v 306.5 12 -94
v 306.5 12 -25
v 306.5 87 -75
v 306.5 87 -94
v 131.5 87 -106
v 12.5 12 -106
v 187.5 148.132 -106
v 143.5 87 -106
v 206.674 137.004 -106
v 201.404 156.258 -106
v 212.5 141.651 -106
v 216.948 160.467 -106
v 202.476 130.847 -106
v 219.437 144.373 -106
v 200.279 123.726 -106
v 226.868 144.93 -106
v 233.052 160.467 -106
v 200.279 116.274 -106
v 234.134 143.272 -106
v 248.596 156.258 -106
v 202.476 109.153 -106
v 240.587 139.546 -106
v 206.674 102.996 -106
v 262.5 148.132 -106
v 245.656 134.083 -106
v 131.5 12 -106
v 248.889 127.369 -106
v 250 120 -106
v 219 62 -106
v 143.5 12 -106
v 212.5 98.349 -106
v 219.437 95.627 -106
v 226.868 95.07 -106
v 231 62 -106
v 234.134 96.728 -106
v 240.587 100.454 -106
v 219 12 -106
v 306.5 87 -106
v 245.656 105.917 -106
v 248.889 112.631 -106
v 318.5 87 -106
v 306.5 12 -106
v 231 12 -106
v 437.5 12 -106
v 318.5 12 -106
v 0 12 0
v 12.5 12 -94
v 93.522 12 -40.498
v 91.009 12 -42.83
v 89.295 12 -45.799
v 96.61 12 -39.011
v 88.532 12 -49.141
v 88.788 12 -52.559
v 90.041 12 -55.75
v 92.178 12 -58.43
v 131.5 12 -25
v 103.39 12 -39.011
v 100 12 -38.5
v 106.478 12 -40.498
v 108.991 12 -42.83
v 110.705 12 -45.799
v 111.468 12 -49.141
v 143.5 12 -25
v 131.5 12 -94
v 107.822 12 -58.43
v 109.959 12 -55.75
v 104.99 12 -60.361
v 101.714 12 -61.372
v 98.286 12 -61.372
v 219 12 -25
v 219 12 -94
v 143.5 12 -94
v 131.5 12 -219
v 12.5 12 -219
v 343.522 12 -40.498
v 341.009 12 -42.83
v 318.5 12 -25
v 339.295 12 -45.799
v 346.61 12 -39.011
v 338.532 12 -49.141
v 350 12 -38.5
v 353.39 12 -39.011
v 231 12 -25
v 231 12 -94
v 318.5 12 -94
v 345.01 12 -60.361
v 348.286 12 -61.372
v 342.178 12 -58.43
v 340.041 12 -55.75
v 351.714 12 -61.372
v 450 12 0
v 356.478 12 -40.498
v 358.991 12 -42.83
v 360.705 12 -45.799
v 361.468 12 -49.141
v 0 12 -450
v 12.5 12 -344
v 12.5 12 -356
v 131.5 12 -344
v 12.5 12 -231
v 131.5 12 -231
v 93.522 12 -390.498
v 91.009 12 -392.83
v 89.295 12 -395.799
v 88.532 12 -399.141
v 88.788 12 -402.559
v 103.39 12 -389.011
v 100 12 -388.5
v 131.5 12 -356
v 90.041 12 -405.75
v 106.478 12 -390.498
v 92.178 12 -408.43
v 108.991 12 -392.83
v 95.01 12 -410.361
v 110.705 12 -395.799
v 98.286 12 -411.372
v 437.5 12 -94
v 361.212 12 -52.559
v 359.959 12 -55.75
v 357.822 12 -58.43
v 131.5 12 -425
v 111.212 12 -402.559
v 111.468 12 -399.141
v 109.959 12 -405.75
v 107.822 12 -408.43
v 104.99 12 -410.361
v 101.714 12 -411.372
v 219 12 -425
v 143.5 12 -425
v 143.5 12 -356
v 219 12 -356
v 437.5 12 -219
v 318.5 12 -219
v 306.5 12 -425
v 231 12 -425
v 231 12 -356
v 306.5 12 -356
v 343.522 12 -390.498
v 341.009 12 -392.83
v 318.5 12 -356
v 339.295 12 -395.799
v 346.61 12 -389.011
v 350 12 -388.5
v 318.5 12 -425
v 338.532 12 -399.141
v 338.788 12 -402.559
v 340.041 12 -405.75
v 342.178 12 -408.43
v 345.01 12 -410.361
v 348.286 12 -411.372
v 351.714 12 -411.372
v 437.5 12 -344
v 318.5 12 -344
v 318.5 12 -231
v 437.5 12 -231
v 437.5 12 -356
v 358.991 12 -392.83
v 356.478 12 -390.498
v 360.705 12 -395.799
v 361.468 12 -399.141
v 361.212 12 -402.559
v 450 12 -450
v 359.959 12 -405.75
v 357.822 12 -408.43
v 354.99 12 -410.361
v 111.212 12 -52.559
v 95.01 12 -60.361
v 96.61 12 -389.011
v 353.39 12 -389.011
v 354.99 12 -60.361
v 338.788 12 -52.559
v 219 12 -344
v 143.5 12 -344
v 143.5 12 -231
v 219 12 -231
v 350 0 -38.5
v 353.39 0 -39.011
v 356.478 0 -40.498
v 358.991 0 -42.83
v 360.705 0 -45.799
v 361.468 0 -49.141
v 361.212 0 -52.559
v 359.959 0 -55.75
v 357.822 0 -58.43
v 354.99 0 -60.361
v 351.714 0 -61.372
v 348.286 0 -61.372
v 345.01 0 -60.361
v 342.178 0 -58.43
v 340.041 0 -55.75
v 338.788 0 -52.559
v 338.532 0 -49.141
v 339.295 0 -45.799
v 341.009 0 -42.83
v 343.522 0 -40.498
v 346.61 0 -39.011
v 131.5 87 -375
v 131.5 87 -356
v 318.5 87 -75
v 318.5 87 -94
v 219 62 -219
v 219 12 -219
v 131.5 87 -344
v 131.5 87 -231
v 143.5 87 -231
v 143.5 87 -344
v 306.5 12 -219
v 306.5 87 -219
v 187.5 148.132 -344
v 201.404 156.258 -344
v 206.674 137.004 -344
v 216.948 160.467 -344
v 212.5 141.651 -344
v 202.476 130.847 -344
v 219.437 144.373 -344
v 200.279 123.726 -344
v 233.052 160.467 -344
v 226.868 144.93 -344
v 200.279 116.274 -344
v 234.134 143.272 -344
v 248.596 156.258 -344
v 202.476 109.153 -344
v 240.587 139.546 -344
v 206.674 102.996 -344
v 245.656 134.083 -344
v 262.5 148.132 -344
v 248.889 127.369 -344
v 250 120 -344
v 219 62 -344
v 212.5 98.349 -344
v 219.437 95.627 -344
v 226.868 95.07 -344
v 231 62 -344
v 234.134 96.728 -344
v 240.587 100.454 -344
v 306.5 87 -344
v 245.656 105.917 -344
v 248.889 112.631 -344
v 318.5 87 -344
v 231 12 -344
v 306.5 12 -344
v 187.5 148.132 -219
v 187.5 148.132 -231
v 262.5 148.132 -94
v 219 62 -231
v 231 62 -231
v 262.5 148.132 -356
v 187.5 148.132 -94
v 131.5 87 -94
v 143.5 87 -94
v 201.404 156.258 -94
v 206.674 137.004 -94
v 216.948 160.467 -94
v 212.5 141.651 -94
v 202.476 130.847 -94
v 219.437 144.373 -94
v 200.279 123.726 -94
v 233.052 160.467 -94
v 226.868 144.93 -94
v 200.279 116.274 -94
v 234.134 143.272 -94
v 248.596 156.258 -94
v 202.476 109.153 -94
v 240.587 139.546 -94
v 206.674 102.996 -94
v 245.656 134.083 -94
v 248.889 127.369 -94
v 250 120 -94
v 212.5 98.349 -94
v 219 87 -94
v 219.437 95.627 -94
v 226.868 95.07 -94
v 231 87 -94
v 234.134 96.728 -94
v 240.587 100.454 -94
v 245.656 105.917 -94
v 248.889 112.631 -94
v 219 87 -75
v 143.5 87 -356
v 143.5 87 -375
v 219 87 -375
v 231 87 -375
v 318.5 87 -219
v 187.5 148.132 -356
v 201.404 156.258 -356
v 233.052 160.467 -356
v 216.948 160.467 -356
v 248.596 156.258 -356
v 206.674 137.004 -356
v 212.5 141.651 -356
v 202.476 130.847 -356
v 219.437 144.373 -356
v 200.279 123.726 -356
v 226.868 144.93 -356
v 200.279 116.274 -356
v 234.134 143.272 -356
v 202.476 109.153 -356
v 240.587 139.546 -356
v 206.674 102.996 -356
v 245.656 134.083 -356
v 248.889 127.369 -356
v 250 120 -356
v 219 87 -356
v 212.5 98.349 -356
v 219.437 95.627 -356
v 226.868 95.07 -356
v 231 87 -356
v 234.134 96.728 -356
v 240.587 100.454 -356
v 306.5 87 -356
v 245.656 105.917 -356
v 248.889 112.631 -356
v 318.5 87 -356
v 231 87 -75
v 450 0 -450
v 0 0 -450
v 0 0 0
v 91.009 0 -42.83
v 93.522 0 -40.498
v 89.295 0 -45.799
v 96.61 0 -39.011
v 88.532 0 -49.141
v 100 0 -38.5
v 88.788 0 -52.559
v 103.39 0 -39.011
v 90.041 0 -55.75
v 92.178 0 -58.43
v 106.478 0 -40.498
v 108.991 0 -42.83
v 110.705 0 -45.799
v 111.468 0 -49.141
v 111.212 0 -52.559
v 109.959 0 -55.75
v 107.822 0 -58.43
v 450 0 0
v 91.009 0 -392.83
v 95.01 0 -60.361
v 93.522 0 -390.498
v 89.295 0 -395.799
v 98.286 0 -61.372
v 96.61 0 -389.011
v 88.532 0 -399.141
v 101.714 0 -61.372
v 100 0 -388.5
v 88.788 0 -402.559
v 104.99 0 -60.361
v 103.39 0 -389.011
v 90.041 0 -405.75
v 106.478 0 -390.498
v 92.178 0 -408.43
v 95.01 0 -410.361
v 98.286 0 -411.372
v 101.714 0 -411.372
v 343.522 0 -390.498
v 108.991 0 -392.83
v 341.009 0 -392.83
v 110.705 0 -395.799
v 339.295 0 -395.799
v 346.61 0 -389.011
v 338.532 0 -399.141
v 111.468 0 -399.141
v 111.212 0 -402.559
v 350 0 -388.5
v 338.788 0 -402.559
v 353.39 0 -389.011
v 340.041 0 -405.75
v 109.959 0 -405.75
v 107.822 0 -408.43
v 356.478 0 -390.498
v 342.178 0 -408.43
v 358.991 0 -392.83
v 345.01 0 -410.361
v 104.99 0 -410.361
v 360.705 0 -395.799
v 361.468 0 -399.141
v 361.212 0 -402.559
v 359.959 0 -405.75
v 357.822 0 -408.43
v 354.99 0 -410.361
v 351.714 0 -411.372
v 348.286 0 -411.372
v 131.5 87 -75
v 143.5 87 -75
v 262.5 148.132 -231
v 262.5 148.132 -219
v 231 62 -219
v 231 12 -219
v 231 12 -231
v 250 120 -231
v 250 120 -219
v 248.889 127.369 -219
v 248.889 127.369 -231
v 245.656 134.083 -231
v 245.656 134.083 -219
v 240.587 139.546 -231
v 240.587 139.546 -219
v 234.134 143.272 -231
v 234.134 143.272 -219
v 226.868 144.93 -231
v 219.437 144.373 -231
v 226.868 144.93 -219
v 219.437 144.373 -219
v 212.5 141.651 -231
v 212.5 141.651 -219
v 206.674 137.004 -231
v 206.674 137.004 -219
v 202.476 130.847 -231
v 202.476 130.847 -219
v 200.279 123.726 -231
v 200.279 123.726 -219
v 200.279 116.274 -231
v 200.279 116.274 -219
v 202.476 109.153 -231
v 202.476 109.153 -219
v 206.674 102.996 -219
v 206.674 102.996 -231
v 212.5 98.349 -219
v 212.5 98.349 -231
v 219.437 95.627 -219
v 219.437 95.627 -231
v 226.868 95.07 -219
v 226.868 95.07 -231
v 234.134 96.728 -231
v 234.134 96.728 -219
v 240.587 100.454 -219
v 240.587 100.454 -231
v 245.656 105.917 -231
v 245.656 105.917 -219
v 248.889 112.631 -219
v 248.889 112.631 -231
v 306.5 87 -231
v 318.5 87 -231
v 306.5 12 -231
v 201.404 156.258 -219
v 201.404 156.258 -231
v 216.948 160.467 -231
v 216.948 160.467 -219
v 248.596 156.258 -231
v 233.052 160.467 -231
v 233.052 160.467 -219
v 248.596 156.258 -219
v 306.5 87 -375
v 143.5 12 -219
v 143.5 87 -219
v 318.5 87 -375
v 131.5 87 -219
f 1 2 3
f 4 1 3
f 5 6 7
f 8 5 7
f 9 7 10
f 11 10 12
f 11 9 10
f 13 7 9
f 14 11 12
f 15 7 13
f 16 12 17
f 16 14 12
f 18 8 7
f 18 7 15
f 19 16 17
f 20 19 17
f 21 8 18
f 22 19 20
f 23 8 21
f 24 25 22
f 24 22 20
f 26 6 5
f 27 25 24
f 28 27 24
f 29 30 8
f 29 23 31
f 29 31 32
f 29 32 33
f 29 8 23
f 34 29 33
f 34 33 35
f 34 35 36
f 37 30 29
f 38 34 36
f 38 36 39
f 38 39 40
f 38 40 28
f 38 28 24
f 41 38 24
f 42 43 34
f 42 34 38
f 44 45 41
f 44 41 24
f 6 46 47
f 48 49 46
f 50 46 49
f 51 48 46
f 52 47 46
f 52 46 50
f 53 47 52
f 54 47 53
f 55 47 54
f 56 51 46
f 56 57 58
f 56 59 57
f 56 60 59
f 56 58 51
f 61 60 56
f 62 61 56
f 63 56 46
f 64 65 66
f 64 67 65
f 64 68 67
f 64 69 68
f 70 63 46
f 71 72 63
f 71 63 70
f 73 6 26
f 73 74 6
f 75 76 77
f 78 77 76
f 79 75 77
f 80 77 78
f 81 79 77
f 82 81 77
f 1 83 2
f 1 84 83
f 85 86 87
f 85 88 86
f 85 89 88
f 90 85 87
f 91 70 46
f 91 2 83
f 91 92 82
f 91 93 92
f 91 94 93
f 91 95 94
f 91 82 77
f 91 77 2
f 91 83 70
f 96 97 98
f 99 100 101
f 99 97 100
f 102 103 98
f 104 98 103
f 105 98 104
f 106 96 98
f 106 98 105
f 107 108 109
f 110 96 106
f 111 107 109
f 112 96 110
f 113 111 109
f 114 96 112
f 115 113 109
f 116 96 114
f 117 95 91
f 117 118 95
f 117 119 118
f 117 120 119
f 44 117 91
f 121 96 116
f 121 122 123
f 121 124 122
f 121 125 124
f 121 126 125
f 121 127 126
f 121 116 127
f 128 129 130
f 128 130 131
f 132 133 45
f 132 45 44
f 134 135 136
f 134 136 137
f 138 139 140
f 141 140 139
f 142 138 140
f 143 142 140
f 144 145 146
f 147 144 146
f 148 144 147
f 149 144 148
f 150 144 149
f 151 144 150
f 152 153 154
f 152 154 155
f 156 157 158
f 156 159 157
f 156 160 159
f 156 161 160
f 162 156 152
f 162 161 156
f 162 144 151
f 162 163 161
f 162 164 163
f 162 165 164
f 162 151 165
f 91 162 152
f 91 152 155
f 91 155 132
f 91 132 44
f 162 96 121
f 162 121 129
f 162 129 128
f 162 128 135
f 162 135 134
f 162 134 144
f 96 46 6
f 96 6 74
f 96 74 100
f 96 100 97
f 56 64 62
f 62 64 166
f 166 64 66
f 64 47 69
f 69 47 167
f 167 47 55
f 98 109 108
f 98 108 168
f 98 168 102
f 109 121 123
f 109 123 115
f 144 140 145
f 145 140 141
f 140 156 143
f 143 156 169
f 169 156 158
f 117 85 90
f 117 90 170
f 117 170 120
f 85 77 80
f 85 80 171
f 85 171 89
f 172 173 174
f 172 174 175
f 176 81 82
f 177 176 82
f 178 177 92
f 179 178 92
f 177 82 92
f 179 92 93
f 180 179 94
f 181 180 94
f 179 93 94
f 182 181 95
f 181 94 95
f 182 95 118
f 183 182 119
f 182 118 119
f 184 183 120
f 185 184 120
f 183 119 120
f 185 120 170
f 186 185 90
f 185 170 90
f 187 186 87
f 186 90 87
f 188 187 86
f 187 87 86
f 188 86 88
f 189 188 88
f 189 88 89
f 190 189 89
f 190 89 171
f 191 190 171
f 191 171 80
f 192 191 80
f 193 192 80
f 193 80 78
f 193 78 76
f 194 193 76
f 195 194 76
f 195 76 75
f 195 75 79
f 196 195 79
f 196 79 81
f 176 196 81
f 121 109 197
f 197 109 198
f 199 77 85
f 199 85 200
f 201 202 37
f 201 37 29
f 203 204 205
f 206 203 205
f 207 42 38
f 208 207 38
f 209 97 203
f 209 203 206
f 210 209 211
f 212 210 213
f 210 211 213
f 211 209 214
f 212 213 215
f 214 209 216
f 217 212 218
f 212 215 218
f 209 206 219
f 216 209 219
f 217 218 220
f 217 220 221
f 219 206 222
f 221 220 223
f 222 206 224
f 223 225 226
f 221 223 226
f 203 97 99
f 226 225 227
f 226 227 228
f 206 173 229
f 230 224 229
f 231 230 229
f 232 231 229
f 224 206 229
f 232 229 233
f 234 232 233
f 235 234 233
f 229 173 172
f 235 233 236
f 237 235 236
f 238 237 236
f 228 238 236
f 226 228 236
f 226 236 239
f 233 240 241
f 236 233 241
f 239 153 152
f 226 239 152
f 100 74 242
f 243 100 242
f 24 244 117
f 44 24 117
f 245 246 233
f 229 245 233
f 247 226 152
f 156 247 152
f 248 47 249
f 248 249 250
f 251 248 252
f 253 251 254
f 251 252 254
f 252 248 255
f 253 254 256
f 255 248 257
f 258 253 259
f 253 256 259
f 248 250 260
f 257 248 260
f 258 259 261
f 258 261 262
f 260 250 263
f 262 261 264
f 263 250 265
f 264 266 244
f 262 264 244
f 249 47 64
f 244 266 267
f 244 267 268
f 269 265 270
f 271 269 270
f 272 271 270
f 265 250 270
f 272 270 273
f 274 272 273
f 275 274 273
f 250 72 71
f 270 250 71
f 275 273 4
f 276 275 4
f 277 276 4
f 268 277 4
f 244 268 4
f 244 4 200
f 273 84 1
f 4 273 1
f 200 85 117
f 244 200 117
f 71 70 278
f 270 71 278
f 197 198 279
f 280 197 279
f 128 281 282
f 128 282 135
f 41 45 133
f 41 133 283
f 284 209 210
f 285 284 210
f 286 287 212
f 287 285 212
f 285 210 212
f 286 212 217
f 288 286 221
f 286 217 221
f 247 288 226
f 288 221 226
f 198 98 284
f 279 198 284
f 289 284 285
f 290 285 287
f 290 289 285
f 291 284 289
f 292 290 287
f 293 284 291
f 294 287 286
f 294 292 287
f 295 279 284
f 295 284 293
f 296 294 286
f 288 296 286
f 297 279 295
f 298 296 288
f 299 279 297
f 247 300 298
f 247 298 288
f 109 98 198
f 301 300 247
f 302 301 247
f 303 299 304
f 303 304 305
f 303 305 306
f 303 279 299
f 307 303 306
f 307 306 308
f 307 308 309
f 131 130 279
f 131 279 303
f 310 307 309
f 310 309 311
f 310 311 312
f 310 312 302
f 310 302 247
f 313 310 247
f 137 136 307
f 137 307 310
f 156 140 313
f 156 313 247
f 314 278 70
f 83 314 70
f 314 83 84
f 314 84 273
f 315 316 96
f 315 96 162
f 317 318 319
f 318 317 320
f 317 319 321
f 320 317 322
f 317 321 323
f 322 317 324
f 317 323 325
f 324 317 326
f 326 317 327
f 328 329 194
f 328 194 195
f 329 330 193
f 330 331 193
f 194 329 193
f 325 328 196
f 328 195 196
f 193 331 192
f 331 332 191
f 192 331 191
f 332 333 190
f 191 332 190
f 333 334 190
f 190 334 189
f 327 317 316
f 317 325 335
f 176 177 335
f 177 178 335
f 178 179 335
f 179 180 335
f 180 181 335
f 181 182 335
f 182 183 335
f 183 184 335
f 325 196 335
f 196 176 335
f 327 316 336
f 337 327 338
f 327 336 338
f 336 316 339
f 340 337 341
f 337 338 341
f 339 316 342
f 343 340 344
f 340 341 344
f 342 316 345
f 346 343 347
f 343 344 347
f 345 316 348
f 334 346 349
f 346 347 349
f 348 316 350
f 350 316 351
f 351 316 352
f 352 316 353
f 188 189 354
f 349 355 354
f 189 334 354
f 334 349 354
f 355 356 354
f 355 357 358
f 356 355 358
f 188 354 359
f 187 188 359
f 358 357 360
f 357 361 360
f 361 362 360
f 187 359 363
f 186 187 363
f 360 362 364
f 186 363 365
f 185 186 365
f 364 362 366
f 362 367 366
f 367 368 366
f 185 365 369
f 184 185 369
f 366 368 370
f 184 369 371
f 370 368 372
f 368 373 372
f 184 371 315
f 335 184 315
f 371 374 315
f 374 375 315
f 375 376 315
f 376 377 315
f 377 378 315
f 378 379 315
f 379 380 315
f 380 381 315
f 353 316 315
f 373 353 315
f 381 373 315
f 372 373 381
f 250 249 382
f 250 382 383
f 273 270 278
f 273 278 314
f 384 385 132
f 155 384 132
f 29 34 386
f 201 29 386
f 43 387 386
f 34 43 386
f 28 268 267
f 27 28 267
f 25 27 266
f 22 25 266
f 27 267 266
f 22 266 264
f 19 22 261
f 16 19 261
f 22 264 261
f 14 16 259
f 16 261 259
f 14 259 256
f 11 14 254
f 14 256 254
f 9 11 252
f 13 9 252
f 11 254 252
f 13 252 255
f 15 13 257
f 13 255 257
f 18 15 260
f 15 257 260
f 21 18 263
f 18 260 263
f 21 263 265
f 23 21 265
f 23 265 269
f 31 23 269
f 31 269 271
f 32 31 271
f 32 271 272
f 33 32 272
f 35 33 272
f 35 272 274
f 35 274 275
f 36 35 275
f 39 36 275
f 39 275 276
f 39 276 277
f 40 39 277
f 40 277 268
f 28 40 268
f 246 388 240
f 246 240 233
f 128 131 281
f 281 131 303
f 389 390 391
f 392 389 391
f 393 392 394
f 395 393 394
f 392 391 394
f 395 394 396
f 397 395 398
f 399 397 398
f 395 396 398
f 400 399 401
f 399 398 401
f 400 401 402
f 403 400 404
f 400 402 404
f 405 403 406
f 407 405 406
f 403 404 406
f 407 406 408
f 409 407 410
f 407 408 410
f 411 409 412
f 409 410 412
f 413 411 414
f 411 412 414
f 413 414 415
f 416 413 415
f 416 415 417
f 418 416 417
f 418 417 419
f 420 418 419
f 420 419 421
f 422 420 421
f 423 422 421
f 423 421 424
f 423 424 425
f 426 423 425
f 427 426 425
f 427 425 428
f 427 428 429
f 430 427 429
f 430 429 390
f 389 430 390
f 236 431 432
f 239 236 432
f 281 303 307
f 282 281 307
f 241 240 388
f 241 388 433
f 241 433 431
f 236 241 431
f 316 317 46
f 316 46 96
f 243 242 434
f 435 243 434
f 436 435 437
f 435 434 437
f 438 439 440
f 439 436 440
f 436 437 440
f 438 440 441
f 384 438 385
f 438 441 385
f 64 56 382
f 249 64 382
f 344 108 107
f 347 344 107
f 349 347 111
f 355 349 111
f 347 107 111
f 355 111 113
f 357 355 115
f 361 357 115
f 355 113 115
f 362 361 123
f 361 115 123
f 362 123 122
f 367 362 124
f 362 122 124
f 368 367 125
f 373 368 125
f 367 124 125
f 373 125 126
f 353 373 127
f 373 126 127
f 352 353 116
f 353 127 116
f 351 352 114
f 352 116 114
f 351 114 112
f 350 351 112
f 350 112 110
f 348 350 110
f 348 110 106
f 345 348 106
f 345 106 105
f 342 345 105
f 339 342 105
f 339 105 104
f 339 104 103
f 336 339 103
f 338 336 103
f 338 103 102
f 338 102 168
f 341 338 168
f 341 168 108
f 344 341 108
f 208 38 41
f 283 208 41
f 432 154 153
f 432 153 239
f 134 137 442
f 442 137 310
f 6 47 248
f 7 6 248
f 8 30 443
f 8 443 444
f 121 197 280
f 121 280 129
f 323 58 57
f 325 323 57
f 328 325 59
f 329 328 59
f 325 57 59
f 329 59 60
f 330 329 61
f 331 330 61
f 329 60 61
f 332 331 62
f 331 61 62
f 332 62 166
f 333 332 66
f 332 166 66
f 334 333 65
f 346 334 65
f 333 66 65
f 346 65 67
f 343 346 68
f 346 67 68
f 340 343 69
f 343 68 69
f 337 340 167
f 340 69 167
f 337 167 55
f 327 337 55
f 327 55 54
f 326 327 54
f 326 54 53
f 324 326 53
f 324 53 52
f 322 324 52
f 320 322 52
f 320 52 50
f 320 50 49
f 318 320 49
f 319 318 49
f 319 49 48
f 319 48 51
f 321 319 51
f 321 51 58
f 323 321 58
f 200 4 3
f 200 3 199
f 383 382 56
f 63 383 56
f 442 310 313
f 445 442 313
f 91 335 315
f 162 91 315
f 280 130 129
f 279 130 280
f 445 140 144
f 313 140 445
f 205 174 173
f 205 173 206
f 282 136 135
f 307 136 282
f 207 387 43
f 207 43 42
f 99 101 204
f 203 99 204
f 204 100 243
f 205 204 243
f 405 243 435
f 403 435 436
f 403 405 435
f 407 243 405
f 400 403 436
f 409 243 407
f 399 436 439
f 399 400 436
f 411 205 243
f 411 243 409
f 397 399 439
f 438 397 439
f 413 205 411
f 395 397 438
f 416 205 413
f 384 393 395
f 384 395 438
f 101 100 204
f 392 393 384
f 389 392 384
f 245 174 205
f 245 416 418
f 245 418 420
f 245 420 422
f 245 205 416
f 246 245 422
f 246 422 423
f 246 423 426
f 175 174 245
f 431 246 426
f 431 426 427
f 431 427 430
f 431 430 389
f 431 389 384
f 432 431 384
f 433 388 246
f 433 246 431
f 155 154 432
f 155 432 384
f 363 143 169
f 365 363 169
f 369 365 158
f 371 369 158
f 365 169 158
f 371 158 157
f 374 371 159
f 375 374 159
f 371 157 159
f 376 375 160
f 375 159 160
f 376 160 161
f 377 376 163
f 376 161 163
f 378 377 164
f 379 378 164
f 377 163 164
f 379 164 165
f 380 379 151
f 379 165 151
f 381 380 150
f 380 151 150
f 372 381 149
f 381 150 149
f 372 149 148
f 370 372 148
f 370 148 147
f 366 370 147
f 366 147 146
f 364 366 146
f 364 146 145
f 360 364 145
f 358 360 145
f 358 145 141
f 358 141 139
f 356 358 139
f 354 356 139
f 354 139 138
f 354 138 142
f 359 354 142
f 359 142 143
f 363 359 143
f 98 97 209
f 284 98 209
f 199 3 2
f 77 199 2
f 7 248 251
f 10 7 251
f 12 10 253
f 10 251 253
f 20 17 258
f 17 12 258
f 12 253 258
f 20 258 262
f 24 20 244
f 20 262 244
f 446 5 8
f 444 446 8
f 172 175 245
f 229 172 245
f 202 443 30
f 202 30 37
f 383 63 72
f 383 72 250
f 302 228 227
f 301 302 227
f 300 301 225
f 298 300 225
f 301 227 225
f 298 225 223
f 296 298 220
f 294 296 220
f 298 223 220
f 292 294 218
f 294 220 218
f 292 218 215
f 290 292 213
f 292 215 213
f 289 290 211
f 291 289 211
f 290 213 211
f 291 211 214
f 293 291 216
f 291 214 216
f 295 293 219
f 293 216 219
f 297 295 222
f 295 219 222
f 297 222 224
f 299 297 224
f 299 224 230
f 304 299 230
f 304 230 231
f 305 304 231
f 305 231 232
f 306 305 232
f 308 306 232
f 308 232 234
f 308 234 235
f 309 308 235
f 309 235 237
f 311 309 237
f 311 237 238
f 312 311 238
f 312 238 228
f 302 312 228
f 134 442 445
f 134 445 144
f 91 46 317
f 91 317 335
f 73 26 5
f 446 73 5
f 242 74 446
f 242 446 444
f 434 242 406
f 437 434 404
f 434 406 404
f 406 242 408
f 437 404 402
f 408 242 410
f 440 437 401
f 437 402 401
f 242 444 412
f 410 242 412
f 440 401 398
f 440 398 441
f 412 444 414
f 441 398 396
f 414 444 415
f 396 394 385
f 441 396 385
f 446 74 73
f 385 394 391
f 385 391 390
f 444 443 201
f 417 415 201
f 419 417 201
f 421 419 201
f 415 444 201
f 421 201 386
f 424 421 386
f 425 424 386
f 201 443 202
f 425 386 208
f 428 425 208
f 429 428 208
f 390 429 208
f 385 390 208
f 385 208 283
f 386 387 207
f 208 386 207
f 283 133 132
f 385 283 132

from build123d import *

# Parameters (mm, degrees)
SKETCH_1_W          = 450
SKETCH_1_H          = 450
EXTRUDE_1_DEPTH     = 12
SKETCH_2_R          = 11.5
CUT_EXTRUDE_1_DEPTH = 637.509230098
SKETCH_5_W          = 450
SKETCH_5_H          = 12
EXTRUDE_2_DEPTH     = 150
SKETCH_6_R          = 25
CUT_EXTRUDE_2_DEPTH = 597.221435374
SKETCH_7_W          = 12
SKETCH_7_H          = 75
EXTRUDE_3_DEPTH     = 450
CUT_EXTRUDE_4_DEPTH = 575.337226723
SKETCH_10_W         = 113
SKETCH_10_H         = 25
CUT_EXTRUDE_5_DEPTH = 12


with BuildPart() as part:
    # 草图1 → 凸台-拉伸1 (new body)
    with BuildSketch(Plane(origin=(0, 0, 0), x_dir=(1, 0, 0), z_dir=(0, 1, 0))):
        with Locations((225, 225)):
            Rectangle(SKETCH_1_W, SKETCH_1_H)
    extrude(amount=EXTRUDE_1_DEPTH)

    # 草图2 → 切除-拉伸1 (cut, through all)
    with BuildSketch(Plane(origin=(0, 12, 0), x_dir=(1, 0, 0), z_dir=(0, 1, 0))):
        with Locations(Location((100, 50, 0), (0, 0, 270))):
            Circle(SKETCH_2_R)
        with Locations(Location((100, 400, 0), (0, 0, 270))):
            Circle(SKETCH_2_R)
        with Locations(Location((350, 400, 0), (0, 0, 270))):
            Circle(SKETCH_2_R)
        with Locations(Location((350, 50, 0), (0, 0, 270))):
            Circle(SKETCH_2_R)
    extrude(amount=-CUT_EXTRUDE_1_DEPTH, mode=Mode.SUBTRACT)

    # 草图5 → 凸台-拉伸2 (add)
    with BuildSketch(Plane(origin=(0, 12, 0), x_dir=(1, 0, 0), z_dir=(0, 1, 0))):
        with Locations((225, 350)):
            Rectangle(SKETCH_5_W, SKETCH_5_H)
        with Locations((225, 225)):
            Rectangle(SKETCH_5_W, SKETCH_5_H)
        with Locations((225, 100)):
            Rectangle(SKETCH_5_W, SKETCH_5_H)
    extrude(amount=EXTRUDE_2_DEPTH)

    # 草图6 → 切除-拉伸2 (cut, through all)
    with BuildSketch(Plane.XY.offset(-94)):
        with Locations((225, 120)):
            Circle(SKETCH_6_R)
        with BuildLine():
            Line((0, 162), (0, 12))
            Line((0, 12), (12.5, 12))
            Line((12.5, 12), (187.5, 148.131907659))
            ThreePointArc((187.5, 148.131907659), (225, 161), (262.5, 148.131907659))
            Line((262.5, 148.131907659), (437.5, 12))
            Line((437.5, 12), (450, 12))
            Line((450, 12), (450, 162))
            Line((450, 162), (0, 162))
        make_face()
    extrude(amount=-CUT_EXTRUDE_2_DEPTH, mode=Mode.SUBTRACT)

    # 草图7 → 凸台-拉伸3 (add)
    with BuildSketch(Plane.XY):
        with Locations((225, 49.5)):
            Rectangle(SKETCH_7_W, SKETCH_7_H)
        with Locations((137.5, 49.5)):
            Rectangle(SKETCH_7_W, SKETCH_7_H)
        with Locations((312.5, 49.5)):
            Rectangle(SKETCH_7_W, SKETCH_7_H)
    extrude(amount=-EXTRUDE_3_DEPTH)

    # 草图9 → 切除-拉伸4 (cut, through all)
    with BuildSketch(Plane.ZY.offset(-131.5)):
        Polygon((-450, 87), (-375, 87), (-425, 12), (-450, 12), align=None)
        Polygon((0, 87), (-75, 87), (-25, 12), (0, 12), align=None)
    extrude(amount=-CUT_EXTRUDE_4_DEPTH, mode=Mode.SUBTRACT)

    # 草图10 → 切除-拉伸5 (cut)
    with BuildSketch(Plane(origin=(231, 0, 0), x_dir=(0, 0, -1), z_dir=(1, 0, 0))):
        with Locations((162.5, 74.5)):
            Rectangle(SKETCH_10_W, SKETCH_10_H)
        with Locations((287.5, 74.5)):
            Rectangle(SKETCH_10_W, SKETCH_10_H)
    extrude(amount=-CUT_EXTRUDE_5_DEPTH, mode=Mode.SUBTRACT)


solid = part.part
